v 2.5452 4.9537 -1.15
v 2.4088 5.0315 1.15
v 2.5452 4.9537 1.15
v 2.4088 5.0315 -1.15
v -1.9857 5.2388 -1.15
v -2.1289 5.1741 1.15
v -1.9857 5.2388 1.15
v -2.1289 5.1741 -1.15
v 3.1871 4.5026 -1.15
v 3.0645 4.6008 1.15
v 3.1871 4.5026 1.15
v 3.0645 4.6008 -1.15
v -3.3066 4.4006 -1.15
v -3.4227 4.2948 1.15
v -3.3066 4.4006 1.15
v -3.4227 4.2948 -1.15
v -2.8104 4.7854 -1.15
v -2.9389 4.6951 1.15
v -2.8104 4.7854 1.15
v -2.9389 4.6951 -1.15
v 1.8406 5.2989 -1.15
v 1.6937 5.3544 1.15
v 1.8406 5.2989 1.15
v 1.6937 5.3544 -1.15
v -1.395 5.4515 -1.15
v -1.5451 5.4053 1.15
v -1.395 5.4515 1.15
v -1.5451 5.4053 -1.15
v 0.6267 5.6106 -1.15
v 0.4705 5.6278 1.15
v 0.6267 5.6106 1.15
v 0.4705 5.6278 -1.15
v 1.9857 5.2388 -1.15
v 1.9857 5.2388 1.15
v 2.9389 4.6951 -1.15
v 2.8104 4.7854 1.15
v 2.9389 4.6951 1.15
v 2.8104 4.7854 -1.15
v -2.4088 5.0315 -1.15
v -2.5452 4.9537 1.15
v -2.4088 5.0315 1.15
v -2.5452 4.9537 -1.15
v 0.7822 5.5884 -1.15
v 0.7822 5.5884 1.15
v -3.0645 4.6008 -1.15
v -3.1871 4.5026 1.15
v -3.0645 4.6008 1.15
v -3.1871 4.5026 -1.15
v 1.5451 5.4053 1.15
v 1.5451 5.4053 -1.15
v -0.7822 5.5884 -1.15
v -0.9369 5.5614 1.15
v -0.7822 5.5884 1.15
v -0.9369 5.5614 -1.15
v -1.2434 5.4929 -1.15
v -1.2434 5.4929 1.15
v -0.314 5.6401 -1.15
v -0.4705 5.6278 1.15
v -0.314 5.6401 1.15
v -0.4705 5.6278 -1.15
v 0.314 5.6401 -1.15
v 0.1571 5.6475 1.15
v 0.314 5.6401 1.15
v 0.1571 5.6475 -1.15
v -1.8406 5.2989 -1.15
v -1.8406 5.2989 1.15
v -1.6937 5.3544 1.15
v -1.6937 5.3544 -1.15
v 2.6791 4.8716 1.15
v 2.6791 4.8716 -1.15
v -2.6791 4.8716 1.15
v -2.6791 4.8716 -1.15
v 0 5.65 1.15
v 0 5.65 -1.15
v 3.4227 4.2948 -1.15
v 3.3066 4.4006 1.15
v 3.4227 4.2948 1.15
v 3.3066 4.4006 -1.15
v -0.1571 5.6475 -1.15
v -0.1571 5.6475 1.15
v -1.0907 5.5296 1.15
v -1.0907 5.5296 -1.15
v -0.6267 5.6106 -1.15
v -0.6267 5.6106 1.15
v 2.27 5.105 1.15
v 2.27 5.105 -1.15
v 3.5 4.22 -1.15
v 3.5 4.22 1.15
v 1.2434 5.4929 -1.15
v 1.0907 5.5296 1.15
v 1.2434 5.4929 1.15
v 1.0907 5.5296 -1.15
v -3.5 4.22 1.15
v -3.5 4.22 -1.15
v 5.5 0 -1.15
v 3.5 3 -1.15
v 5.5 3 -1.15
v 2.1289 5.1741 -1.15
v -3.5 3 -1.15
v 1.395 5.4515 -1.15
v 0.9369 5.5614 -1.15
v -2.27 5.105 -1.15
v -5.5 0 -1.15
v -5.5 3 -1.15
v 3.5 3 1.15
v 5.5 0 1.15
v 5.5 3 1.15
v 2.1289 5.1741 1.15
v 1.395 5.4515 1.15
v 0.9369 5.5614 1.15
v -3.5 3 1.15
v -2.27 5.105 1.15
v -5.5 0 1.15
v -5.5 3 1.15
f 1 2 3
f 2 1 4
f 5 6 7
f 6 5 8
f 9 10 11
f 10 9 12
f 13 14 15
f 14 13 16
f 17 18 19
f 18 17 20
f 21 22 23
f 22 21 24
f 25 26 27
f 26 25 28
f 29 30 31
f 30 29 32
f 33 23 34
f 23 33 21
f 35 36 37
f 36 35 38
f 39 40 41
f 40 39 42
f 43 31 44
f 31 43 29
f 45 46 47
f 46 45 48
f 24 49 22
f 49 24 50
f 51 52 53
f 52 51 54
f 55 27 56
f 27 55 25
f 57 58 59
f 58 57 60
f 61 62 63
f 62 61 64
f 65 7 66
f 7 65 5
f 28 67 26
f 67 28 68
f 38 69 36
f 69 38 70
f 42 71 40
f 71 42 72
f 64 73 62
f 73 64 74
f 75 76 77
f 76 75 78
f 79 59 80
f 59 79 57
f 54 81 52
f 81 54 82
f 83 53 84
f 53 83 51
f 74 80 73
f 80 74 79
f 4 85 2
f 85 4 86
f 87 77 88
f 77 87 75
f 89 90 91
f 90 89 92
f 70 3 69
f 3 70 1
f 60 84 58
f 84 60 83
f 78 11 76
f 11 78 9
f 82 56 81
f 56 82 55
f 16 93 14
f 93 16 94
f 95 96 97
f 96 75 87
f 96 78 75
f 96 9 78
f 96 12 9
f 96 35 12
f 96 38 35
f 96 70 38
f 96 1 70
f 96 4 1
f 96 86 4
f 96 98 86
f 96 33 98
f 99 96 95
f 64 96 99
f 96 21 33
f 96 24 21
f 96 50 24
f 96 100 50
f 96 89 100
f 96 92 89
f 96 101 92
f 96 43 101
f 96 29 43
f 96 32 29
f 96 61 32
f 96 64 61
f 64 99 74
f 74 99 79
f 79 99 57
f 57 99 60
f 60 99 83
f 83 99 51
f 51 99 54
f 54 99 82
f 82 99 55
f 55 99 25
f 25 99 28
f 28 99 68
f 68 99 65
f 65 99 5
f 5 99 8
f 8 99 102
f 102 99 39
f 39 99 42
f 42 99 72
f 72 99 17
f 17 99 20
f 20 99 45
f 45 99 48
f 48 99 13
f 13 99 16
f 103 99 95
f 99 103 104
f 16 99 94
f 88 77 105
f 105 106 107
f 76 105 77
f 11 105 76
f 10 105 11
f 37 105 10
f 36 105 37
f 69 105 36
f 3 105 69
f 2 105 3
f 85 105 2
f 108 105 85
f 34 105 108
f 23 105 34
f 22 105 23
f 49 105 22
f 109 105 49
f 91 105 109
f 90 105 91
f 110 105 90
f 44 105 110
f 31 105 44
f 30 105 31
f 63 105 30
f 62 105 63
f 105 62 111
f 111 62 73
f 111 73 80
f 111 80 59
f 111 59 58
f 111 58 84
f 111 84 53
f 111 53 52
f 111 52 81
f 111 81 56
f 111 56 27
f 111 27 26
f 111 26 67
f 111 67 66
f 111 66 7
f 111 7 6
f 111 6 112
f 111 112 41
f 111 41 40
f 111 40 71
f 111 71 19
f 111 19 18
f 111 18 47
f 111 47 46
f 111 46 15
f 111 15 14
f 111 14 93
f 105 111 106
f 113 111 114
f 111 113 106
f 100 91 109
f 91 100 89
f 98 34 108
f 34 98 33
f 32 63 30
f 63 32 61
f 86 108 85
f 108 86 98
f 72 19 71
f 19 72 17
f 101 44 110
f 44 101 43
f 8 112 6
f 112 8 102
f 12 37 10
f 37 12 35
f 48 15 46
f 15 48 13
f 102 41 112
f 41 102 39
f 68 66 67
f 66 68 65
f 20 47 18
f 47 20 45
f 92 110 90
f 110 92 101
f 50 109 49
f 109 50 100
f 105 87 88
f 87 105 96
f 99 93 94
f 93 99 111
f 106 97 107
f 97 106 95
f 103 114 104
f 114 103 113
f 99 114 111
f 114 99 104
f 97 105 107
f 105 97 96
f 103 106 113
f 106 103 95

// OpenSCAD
translate([0,5.85,0])intersection() {
translate([0,-5.2,0])cylinder(2.3,5,5, center=true,$fn=200);
cube([7,6,2.5],center=true);
};
translate([0,1.5,0])cube([11,3,2.3],center=true);
